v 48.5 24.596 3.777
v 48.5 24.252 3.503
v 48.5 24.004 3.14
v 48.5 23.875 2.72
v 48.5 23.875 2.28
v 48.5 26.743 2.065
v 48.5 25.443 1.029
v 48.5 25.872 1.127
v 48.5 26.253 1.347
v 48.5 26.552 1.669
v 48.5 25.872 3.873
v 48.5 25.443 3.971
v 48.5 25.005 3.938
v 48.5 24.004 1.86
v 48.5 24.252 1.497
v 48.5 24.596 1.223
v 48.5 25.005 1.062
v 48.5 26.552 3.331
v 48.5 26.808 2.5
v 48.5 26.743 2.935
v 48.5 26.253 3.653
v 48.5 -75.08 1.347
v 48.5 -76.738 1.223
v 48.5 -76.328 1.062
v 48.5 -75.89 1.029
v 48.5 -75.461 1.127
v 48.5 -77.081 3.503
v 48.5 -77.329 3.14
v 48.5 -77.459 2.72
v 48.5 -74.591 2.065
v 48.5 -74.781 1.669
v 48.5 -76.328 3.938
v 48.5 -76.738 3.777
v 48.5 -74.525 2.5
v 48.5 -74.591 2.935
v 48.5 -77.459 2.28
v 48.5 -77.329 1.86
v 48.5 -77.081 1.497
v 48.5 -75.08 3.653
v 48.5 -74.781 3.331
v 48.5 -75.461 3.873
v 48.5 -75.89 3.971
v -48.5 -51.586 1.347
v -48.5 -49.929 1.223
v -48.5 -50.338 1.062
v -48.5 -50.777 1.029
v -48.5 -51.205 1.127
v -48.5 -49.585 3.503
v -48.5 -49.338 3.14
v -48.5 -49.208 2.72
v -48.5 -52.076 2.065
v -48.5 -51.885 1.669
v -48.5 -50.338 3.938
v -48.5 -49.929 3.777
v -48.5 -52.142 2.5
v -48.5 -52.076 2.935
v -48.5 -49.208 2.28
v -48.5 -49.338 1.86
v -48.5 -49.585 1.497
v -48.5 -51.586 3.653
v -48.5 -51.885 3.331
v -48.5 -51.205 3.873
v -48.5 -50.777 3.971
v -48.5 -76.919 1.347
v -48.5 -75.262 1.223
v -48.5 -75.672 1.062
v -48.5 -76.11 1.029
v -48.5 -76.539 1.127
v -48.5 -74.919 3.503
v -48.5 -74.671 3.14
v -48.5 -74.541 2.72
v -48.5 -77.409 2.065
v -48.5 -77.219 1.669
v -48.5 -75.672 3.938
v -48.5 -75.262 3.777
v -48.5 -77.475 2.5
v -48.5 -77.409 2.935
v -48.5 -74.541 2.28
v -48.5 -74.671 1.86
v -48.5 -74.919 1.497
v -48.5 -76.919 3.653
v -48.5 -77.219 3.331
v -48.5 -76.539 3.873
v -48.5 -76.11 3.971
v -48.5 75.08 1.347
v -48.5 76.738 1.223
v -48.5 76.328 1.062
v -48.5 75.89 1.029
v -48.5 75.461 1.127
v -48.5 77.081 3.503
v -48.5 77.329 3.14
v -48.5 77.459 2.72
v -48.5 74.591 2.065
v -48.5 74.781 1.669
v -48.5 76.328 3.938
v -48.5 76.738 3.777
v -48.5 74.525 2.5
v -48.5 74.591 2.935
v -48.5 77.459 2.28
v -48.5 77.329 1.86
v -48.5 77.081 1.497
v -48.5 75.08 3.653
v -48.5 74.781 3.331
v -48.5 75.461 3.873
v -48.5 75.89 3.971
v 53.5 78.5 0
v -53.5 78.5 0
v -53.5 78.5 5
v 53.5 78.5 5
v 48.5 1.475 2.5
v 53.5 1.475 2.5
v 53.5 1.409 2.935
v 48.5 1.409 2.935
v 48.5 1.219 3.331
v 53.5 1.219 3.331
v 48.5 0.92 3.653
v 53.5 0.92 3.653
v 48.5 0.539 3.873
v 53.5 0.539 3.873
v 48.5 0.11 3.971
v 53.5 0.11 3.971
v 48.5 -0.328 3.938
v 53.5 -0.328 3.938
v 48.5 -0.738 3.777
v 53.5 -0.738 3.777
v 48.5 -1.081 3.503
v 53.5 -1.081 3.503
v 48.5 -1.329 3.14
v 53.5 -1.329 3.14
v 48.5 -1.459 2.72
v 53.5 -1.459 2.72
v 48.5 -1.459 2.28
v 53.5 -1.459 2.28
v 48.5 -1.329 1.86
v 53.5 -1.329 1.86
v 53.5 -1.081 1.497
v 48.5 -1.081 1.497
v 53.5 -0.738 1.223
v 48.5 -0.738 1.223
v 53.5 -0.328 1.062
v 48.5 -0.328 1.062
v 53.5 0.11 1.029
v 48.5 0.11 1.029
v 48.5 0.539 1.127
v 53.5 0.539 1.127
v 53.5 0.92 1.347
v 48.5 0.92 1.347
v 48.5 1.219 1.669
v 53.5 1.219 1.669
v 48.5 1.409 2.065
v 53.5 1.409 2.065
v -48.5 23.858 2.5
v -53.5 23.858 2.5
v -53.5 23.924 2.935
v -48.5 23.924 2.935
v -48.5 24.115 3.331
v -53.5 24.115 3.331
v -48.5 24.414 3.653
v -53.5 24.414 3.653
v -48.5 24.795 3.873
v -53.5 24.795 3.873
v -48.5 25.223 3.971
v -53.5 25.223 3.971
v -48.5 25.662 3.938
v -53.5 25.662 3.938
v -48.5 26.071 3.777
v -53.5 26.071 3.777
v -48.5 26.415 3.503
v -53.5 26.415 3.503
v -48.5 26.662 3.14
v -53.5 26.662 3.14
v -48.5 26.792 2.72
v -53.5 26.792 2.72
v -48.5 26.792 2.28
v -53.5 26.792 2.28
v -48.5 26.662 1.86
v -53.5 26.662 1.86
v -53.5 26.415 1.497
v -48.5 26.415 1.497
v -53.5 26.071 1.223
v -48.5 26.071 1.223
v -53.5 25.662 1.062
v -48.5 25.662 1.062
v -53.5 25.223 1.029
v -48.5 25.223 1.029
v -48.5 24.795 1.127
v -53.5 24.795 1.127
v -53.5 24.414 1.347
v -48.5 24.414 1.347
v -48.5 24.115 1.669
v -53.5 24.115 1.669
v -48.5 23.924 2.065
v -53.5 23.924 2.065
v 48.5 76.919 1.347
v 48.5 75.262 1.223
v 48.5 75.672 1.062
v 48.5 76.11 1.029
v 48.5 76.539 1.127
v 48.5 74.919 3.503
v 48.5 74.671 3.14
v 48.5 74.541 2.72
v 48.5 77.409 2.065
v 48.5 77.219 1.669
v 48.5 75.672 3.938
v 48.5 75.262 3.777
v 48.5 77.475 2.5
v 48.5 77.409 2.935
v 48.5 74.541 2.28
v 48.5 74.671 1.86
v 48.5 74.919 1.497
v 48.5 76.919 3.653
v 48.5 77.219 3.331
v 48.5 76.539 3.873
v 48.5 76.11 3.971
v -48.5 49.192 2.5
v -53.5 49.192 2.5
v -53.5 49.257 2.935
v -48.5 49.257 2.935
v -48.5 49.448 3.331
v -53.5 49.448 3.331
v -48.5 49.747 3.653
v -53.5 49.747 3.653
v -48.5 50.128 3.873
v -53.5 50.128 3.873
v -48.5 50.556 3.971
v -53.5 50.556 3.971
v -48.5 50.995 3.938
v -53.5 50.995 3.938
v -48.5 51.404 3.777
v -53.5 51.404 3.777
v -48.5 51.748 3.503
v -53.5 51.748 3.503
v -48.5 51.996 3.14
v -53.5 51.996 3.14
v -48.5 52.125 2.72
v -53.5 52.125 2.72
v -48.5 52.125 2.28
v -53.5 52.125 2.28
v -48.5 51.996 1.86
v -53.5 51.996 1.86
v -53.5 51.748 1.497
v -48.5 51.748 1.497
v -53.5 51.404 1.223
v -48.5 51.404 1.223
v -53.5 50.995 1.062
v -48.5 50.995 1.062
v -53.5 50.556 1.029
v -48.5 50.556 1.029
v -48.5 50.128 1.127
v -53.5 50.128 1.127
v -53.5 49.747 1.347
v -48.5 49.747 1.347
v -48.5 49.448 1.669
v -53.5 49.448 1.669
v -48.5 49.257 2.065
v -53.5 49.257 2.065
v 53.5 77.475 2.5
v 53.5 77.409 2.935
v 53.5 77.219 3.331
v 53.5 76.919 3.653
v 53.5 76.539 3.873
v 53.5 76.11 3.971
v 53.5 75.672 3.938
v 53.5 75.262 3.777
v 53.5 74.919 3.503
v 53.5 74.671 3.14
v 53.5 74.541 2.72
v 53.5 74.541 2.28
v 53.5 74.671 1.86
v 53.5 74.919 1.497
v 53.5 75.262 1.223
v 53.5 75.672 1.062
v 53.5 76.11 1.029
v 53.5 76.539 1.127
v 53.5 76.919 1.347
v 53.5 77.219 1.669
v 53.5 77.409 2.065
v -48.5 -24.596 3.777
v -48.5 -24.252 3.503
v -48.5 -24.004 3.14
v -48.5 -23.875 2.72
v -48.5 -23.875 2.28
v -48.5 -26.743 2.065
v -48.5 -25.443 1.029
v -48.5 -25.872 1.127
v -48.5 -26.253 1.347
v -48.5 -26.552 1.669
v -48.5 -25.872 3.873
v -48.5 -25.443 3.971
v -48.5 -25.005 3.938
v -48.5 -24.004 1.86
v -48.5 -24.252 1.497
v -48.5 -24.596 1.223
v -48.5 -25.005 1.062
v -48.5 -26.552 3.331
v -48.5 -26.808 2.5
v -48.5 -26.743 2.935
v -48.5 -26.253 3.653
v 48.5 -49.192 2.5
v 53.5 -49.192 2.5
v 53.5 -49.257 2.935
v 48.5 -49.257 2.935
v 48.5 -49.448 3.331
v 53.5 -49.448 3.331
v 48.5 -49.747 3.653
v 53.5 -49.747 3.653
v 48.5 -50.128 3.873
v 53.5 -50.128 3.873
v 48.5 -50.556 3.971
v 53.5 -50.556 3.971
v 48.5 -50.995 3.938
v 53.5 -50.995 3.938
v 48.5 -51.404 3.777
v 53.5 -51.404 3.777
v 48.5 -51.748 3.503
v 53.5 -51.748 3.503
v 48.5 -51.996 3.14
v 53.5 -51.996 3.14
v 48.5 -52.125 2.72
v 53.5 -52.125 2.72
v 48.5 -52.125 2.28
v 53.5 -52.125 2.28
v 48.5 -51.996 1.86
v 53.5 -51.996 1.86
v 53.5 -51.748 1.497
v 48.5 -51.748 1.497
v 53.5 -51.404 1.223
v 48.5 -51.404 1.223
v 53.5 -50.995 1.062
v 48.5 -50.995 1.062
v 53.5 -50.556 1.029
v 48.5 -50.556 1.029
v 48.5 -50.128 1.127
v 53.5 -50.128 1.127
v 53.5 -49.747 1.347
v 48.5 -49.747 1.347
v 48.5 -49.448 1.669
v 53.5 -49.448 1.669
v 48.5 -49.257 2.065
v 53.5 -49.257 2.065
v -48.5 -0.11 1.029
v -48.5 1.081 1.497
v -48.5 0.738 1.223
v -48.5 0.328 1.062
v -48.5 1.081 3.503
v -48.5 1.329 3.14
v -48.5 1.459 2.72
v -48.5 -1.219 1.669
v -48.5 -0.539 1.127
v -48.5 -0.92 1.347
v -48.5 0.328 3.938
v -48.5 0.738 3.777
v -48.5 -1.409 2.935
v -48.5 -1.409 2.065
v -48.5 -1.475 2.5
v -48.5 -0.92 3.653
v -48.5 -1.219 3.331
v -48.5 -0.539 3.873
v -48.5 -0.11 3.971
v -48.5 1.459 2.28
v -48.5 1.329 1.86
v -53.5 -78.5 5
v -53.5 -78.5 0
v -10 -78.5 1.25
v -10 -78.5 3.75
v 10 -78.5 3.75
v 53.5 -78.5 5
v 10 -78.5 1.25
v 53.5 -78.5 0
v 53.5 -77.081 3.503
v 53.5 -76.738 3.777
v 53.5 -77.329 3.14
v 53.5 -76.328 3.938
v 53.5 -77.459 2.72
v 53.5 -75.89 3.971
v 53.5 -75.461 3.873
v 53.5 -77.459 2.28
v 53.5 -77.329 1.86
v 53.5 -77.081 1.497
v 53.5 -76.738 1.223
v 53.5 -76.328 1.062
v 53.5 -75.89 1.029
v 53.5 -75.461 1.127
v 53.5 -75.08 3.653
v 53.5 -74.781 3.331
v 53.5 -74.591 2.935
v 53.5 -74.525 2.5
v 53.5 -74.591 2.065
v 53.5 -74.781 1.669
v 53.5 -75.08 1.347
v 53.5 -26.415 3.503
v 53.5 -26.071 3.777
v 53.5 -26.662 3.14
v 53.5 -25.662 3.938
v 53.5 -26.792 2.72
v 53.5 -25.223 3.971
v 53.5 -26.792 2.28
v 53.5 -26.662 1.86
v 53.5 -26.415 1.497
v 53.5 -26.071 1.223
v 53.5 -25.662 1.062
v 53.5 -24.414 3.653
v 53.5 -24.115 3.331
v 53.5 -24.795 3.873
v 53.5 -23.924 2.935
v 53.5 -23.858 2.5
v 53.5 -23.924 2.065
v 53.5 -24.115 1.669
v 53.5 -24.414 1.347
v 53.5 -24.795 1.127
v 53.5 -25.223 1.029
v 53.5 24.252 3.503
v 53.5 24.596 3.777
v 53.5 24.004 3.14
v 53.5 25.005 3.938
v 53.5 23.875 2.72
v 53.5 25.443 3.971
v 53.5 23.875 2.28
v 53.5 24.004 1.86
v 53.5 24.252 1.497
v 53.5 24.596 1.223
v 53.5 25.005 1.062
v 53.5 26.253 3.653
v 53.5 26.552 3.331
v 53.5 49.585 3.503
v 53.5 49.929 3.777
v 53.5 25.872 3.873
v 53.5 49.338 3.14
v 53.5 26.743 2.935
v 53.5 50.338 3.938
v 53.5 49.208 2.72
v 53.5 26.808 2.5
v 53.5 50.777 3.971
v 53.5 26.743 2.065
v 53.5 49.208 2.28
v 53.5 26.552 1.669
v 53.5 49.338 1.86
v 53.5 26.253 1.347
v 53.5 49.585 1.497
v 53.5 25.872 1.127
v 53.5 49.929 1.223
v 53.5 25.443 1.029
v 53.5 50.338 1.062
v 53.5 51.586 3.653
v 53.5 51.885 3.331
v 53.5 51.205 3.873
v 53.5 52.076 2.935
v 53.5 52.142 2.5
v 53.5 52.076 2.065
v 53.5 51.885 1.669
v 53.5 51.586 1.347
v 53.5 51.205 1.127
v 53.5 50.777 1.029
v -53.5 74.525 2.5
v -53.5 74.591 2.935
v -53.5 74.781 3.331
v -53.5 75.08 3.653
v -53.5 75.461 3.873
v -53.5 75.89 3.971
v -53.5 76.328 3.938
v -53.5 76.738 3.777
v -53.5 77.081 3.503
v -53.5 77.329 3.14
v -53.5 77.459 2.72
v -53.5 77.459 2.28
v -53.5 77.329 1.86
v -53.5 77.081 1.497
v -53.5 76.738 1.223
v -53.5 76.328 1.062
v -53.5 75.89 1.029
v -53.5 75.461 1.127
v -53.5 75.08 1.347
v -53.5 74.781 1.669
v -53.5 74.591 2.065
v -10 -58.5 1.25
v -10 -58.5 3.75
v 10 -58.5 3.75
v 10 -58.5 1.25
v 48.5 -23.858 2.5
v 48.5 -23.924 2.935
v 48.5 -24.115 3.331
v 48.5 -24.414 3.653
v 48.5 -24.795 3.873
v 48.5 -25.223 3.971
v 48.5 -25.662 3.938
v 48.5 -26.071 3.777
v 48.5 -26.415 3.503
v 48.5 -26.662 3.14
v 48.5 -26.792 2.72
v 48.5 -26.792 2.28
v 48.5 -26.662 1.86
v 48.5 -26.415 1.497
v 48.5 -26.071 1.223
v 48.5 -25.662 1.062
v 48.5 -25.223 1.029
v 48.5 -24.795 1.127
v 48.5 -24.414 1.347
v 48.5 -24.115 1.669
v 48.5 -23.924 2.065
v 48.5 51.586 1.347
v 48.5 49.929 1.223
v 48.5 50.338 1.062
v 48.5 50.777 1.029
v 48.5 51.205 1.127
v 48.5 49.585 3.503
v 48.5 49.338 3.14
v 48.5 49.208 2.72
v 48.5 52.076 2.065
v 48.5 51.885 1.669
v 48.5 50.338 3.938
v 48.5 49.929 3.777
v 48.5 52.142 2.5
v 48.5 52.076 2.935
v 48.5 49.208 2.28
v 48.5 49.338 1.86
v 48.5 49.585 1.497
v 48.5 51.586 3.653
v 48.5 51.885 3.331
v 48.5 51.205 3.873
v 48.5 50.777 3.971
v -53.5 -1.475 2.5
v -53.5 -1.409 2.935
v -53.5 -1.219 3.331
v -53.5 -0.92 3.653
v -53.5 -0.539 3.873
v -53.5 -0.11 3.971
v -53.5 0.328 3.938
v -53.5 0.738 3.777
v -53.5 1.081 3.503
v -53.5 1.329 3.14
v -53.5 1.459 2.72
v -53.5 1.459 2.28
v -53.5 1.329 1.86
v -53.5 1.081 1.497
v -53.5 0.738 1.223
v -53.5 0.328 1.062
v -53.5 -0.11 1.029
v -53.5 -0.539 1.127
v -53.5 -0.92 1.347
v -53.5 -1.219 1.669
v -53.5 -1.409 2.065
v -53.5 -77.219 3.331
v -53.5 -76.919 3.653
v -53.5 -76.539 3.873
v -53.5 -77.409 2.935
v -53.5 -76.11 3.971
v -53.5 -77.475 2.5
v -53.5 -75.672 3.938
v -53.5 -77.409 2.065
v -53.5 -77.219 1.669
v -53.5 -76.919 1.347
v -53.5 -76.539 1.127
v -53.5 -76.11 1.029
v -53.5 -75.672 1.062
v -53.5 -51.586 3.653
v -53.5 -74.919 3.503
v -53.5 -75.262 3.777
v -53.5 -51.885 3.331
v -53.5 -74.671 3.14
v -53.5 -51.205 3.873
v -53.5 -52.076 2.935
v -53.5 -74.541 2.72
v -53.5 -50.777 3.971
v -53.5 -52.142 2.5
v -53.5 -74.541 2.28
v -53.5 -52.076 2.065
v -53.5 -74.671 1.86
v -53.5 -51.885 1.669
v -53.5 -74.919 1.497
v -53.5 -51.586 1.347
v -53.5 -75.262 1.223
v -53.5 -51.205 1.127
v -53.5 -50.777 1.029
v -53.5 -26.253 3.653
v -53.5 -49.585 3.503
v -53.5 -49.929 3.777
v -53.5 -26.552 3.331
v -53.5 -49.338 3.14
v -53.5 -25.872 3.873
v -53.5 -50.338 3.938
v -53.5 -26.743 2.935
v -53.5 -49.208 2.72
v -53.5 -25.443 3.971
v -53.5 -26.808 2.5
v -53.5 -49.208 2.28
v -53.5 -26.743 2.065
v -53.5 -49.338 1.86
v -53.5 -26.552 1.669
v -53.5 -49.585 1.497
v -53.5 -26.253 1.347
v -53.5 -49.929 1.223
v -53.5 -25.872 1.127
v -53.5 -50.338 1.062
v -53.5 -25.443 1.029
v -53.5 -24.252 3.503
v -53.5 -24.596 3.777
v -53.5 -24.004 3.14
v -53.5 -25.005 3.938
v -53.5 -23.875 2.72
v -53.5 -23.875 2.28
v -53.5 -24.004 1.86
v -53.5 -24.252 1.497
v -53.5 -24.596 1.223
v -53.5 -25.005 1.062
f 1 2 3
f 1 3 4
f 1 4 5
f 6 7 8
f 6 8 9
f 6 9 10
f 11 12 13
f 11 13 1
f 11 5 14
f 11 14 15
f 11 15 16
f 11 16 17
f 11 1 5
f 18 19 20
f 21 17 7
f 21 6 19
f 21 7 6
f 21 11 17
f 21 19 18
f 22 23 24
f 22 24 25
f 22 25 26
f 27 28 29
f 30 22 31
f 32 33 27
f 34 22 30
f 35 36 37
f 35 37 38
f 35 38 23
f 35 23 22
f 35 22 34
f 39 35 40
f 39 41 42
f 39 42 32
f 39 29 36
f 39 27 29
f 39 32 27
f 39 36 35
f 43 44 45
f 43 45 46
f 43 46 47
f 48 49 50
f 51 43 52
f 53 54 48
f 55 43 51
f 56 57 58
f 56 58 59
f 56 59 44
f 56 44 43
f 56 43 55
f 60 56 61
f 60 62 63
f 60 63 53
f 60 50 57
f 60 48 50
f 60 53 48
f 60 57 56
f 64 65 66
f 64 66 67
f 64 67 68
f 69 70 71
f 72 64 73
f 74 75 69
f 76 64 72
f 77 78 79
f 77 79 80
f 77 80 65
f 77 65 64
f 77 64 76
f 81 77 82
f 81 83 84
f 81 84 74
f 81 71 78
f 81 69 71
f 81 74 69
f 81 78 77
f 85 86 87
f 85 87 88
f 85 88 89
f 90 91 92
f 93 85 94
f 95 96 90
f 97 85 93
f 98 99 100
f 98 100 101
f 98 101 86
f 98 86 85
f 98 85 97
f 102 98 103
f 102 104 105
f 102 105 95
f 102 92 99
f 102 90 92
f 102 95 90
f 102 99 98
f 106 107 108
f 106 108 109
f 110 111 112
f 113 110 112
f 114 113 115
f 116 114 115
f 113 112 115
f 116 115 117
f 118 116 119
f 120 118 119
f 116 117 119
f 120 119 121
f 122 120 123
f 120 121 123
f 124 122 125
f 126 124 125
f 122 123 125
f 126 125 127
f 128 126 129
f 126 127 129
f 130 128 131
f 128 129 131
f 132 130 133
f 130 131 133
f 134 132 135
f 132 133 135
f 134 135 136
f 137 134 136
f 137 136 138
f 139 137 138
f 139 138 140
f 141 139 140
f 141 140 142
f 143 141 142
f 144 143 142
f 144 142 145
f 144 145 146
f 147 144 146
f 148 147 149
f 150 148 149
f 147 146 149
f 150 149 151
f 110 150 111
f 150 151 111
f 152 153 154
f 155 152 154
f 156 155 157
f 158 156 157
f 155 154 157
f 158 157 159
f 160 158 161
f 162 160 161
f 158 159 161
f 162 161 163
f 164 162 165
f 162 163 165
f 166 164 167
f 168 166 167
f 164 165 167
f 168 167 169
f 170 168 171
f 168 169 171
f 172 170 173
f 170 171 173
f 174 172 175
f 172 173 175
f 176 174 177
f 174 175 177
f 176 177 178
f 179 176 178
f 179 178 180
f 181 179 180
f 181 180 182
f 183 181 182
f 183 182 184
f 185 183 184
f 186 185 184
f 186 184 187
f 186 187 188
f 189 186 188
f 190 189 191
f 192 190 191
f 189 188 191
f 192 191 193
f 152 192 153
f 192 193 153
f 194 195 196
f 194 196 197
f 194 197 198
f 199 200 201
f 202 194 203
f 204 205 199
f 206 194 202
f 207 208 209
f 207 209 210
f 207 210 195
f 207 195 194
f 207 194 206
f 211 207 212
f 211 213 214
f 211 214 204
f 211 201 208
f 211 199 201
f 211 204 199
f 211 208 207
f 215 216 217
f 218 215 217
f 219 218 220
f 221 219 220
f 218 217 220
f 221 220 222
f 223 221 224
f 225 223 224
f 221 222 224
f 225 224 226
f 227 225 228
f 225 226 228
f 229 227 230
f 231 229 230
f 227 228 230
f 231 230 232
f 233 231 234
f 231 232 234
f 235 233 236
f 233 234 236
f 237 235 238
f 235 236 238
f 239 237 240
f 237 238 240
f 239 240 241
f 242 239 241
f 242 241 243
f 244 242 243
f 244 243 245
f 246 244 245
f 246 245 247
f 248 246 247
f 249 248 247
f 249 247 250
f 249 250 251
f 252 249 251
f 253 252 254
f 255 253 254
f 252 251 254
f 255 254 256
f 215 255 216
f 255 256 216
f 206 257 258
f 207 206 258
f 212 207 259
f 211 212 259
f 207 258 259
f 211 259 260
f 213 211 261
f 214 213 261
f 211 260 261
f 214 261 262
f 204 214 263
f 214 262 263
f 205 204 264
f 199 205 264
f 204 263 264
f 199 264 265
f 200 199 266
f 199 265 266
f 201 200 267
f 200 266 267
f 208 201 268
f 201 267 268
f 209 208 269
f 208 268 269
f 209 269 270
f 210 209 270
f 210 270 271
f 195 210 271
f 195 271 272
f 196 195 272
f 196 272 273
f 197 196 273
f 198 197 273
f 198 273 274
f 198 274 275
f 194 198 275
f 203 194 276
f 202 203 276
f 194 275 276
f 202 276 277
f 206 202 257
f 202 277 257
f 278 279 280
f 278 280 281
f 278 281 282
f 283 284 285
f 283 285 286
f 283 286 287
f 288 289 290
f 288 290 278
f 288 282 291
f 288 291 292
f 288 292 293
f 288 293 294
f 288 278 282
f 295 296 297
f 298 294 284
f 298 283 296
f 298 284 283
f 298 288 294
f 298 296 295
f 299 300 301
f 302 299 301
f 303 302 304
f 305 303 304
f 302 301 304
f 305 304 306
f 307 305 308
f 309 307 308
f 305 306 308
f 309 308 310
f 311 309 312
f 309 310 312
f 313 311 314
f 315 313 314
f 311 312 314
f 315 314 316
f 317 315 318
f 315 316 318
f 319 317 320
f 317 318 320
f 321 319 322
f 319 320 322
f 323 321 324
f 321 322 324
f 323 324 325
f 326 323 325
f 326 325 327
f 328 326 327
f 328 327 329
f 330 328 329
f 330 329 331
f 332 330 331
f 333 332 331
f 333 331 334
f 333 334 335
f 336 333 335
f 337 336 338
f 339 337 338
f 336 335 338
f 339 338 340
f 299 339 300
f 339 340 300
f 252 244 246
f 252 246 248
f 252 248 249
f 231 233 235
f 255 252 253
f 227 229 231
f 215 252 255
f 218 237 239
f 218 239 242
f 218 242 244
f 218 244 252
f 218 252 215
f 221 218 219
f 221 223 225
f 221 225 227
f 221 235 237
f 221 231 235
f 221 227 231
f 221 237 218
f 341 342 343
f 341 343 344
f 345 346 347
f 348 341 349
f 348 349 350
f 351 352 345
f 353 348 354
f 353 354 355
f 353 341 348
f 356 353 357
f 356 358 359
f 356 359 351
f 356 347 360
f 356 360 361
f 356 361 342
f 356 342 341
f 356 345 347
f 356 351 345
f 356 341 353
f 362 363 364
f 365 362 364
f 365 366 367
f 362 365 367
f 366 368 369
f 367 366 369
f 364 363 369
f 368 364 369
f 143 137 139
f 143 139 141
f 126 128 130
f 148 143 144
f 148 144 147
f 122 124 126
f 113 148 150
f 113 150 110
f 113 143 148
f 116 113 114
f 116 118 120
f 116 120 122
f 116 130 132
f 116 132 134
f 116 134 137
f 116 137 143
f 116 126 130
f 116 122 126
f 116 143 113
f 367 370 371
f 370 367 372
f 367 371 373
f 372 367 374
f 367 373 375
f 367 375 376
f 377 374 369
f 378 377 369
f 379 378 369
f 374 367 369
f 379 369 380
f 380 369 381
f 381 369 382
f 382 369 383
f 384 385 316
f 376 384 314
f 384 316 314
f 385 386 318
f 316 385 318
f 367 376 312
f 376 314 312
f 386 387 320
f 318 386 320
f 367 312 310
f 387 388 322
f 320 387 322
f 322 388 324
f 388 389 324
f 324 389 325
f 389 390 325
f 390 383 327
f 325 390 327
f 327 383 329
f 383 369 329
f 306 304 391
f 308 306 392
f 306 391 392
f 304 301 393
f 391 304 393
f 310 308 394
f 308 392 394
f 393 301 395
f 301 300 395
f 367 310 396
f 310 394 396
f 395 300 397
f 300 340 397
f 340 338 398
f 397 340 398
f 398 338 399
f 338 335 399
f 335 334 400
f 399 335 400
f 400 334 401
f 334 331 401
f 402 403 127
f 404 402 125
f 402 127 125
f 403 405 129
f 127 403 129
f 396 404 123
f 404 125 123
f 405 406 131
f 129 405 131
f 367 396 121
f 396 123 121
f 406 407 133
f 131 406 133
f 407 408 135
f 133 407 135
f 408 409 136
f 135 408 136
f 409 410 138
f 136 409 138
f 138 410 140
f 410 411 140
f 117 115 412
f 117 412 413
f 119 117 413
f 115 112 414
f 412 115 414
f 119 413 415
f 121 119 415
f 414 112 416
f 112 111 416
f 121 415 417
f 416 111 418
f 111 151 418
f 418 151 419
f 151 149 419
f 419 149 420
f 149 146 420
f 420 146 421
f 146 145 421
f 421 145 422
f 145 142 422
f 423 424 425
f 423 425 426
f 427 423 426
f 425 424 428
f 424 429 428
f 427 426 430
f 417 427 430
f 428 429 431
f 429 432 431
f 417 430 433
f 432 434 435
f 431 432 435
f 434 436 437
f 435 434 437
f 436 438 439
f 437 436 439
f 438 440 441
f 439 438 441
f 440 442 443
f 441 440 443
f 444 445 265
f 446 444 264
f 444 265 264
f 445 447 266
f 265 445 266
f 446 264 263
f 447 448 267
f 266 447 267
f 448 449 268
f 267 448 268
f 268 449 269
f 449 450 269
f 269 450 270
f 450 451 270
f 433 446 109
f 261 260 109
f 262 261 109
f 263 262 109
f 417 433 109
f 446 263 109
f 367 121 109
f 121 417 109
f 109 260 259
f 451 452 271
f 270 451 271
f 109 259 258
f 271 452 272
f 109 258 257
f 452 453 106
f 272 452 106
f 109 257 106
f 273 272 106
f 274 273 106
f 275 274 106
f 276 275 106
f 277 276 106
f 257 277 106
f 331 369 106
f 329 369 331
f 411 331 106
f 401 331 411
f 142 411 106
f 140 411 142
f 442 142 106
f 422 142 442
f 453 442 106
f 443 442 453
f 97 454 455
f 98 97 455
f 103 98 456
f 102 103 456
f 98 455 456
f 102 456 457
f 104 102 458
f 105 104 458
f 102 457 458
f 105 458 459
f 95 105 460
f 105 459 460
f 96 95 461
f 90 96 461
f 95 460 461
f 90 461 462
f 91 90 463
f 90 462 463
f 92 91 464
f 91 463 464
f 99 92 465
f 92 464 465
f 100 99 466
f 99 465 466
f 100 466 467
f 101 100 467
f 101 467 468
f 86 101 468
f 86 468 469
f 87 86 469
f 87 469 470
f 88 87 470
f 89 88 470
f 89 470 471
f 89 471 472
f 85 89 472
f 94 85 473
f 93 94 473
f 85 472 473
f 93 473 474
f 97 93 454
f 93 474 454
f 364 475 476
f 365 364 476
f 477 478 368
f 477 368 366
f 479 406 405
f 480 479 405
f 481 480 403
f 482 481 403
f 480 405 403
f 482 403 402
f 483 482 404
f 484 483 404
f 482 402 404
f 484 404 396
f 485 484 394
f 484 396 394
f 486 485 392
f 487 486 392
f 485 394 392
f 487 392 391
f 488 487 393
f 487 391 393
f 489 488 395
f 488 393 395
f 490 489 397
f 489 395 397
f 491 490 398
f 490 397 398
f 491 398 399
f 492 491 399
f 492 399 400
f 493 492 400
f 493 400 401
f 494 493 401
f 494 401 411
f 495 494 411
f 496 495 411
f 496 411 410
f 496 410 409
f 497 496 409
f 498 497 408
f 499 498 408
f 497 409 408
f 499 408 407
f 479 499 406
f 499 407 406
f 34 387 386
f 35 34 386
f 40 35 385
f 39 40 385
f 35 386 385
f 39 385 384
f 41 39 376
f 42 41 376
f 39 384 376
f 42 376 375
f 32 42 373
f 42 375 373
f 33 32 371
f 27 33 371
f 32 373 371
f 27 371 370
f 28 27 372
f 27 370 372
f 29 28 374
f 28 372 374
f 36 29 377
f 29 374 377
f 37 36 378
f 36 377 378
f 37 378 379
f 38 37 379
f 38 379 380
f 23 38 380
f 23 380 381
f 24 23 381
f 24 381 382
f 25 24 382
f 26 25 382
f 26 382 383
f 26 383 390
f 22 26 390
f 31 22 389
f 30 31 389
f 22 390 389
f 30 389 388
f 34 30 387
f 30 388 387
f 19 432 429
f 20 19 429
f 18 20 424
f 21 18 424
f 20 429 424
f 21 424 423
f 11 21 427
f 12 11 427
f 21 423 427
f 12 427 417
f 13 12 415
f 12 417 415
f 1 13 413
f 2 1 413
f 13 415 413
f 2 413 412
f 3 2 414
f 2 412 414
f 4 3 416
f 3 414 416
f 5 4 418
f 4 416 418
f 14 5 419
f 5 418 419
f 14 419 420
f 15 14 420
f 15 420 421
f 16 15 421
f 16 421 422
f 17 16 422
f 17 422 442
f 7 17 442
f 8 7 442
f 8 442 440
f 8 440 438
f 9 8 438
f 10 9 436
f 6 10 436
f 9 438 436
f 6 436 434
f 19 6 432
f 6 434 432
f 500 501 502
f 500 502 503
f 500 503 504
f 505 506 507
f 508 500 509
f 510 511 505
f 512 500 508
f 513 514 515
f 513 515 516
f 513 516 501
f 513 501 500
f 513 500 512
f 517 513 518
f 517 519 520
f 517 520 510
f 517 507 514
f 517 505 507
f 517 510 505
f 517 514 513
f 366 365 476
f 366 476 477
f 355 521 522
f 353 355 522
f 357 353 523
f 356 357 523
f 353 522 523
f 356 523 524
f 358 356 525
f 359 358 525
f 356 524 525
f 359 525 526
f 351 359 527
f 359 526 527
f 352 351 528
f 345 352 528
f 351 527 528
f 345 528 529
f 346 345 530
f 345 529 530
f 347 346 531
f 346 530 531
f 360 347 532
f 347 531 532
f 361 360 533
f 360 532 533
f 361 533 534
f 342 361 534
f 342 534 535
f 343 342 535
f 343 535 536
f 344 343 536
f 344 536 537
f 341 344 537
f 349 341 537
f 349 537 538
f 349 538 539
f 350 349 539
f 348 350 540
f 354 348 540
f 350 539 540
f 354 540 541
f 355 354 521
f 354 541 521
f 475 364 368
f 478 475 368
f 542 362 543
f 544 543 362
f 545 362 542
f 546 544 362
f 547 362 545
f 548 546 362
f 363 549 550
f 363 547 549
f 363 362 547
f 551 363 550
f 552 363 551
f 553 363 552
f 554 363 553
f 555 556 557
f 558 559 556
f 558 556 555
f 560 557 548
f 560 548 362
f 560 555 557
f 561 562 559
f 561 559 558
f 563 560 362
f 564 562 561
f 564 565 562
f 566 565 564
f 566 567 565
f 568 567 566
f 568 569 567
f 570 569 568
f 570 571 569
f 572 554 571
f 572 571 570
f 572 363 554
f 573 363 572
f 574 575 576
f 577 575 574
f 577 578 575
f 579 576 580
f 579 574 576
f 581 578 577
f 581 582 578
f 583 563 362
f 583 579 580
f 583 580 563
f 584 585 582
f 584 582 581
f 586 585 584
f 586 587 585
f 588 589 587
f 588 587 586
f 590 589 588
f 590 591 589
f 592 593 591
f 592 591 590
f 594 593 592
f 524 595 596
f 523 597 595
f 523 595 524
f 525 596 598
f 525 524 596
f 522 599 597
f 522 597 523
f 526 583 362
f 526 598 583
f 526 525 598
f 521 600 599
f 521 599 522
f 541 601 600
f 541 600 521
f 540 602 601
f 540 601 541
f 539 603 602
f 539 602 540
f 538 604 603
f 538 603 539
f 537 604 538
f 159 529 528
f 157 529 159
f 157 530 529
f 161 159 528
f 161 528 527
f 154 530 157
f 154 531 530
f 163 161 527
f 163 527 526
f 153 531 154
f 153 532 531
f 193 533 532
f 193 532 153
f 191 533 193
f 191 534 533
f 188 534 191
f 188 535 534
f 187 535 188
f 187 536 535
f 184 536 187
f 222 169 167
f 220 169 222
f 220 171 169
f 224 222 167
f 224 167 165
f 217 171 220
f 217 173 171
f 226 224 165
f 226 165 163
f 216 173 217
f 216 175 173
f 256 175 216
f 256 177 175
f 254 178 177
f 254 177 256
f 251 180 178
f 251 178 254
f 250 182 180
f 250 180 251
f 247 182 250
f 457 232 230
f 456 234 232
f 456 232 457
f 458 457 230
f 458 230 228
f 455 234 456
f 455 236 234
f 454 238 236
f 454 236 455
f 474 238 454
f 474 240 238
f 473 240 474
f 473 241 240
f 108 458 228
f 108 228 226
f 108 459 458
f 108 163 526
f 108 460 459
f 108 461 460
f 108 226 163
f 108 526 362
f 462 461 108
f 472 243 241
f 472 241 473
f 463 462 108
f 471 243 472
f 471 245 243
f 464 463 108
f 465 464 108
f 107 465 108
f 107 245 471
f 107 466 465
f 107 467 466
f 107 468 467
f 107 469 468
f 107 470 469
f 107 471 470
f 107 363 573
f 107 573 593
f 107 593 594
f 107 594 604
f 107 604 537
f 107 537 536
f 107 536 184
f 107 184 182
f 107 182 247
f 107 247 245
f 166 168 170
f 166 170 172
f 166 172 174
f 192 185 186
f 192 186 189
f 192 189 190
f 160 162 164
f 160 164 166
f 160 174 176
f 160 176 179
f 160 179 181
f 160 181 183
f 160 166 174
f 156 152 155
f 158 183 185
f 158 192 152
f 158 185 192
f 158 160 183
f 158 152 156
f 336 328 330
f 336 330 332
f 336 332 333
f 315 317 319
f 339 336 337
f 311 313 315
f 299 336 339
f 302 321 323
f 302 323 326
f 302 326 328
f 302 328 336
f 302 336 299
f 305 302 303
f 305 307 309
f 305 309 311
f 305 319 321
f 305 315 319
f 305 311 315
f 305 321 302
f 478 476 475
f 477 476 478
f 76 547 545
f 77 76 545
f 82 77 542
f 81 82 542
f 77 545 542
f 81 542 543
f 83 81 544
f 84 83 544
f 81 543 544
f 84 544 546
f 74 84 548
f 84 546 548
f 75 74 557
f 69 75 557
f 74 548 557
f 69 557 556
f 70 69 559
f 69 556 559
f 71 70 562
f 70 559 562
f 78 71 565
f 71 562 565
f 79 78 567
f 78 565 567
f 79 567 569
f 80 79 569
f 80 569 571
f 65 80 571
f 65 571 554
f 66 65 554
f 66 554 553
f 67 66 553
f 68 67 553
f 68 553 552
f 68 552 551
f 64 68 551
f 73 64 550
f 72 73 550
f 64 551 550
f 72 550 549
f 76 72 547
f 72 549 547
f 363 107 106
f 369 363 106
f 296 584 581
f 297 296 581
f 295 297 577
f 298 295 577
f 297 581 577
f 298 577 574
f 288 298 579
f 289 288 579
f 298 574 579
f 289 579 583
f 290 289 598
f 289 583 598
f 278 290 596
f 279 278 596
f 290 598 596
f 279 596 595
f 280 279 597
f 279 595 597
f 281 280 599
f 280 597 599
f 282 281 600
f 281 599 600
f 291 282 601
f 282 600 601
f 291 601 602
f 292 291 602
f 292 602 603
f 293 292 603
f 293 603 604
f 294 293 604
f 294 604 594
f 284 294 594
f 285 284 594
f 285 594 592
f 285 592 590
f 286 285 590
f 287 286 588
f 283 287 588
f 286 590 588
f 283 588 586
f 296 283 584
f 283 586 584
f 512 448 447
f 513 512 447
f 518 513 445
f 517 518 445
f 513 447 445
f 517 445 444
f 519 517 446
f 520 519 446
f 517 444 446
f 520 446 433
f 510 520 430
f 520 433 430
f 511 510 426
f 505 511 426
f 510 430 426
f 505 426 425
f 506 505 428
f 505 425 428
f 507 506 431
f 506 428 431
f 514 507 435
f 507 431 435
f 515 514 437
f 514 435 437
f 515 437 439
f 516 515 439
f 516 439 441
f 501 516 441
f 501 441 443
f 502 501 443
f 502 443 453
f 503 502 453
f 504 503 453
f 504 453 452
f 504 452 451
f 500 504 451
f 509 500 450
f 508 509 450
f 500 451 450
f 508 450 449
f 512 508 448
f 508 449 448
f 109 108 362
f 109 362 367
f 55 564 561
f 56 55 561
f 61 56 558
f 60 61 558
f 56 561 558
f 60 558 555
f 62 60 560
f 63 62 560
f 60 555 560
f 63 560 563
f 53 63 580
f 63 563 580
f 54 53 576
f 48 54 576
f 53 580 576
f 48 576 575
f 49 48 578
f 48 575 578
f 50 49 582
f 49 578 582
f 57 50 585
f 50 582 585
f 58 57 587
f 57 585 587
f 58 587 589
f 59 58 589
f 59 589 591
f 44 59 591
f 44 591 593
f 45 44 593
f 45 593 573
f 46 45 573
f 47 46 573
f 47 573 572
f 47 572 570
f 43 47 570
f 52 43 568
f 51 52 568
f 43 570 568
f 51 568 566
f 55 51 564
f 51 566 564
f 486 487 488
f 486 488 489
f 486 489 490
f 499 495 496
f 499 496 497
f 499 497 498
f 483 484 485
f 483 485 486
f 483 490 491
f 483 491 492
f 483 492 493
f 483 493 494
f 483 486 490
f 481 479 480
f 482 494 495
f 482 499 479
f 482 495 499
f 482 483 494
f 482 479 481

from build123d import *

# Parameters (mm, degrees)
F0_W     = 107
F0_H     = 157
F1_DEPTH = 5
F2_R     = 1.475
F3_DEPTH = 5
F4_R     = 1.475
F5_DEPTH = 5
F6_W     = 20
F6_H     = 2.5
F7_DEPTH = 20


with BuildPart() as f1:
    # F0 (on Top) → F1 (new body)
    with BuildSketch(Plane.XY):
        Rectangle(F0_W, F0_H)
    extrude(amount=F1_DEPTH)

    # F2 (on face) → F3 (cut)
    with BuildSketch(Plane.YZ.offset(53.5)):
        with Locations((-76, 2.5)):
            Circle(F2_R)
        with Locations((-50.6667, 2.5)):
            Circle(F2_R)
        with Locations((-25.3334, 2.5)):
            Circle(F2_R)
        with Locations((-0.0001, 2.5)):
            Circle(F2_R)
        with Locations((25.3332, 2.5)):
            Circle(F2_R)
        with Locations((50.6665, 2.5)):
            Circle(F2_R)
        with Locations((75.9998, 2.5)):
            Circle(F2_R)
    extrude(amount=-F3_DEPTH, mode=Mode.SUBTRACT)

    # F4 (on face) → F5 (cut)
    with BuildSketch(Plane(origin=(-53.5, 0, 0), x_dir=(0, -1, 0), z_dir=(-1, 0, 0))):
        with Locations((-76, 2.5)):
            Circle(F4_R)
        with Locations((-50.6667, 2.5)):
            Circle(F4_R)
        with Locations((-25.3334, 2.5)):
            Circle(F4_R)
        with Locations((-0.0001, 2.5)):
            Circle(F4_R)
        with Locations((25.3332, 2.5)):
            Circle(F4_R)
        with Locations((50.6665, 2.5)):
            Circle(F4_R)
        with Locations((75.9998, 2.5)):
            Circle(F4_R)
    extrude(amount=-F5_DEPTH, mode=Mode.SUBTRACT)

    # F6 (on face) → F7 (cut)
    with BuildSketch(Plane.XZ.offset(78.5)):
        with Locations((0, 2.5)):
            Rectangle(F6_W, F6_H)
    extrude(amount=-F7_DEPTH, mode=Mode.SUBTRACT)


solid = f1.part
